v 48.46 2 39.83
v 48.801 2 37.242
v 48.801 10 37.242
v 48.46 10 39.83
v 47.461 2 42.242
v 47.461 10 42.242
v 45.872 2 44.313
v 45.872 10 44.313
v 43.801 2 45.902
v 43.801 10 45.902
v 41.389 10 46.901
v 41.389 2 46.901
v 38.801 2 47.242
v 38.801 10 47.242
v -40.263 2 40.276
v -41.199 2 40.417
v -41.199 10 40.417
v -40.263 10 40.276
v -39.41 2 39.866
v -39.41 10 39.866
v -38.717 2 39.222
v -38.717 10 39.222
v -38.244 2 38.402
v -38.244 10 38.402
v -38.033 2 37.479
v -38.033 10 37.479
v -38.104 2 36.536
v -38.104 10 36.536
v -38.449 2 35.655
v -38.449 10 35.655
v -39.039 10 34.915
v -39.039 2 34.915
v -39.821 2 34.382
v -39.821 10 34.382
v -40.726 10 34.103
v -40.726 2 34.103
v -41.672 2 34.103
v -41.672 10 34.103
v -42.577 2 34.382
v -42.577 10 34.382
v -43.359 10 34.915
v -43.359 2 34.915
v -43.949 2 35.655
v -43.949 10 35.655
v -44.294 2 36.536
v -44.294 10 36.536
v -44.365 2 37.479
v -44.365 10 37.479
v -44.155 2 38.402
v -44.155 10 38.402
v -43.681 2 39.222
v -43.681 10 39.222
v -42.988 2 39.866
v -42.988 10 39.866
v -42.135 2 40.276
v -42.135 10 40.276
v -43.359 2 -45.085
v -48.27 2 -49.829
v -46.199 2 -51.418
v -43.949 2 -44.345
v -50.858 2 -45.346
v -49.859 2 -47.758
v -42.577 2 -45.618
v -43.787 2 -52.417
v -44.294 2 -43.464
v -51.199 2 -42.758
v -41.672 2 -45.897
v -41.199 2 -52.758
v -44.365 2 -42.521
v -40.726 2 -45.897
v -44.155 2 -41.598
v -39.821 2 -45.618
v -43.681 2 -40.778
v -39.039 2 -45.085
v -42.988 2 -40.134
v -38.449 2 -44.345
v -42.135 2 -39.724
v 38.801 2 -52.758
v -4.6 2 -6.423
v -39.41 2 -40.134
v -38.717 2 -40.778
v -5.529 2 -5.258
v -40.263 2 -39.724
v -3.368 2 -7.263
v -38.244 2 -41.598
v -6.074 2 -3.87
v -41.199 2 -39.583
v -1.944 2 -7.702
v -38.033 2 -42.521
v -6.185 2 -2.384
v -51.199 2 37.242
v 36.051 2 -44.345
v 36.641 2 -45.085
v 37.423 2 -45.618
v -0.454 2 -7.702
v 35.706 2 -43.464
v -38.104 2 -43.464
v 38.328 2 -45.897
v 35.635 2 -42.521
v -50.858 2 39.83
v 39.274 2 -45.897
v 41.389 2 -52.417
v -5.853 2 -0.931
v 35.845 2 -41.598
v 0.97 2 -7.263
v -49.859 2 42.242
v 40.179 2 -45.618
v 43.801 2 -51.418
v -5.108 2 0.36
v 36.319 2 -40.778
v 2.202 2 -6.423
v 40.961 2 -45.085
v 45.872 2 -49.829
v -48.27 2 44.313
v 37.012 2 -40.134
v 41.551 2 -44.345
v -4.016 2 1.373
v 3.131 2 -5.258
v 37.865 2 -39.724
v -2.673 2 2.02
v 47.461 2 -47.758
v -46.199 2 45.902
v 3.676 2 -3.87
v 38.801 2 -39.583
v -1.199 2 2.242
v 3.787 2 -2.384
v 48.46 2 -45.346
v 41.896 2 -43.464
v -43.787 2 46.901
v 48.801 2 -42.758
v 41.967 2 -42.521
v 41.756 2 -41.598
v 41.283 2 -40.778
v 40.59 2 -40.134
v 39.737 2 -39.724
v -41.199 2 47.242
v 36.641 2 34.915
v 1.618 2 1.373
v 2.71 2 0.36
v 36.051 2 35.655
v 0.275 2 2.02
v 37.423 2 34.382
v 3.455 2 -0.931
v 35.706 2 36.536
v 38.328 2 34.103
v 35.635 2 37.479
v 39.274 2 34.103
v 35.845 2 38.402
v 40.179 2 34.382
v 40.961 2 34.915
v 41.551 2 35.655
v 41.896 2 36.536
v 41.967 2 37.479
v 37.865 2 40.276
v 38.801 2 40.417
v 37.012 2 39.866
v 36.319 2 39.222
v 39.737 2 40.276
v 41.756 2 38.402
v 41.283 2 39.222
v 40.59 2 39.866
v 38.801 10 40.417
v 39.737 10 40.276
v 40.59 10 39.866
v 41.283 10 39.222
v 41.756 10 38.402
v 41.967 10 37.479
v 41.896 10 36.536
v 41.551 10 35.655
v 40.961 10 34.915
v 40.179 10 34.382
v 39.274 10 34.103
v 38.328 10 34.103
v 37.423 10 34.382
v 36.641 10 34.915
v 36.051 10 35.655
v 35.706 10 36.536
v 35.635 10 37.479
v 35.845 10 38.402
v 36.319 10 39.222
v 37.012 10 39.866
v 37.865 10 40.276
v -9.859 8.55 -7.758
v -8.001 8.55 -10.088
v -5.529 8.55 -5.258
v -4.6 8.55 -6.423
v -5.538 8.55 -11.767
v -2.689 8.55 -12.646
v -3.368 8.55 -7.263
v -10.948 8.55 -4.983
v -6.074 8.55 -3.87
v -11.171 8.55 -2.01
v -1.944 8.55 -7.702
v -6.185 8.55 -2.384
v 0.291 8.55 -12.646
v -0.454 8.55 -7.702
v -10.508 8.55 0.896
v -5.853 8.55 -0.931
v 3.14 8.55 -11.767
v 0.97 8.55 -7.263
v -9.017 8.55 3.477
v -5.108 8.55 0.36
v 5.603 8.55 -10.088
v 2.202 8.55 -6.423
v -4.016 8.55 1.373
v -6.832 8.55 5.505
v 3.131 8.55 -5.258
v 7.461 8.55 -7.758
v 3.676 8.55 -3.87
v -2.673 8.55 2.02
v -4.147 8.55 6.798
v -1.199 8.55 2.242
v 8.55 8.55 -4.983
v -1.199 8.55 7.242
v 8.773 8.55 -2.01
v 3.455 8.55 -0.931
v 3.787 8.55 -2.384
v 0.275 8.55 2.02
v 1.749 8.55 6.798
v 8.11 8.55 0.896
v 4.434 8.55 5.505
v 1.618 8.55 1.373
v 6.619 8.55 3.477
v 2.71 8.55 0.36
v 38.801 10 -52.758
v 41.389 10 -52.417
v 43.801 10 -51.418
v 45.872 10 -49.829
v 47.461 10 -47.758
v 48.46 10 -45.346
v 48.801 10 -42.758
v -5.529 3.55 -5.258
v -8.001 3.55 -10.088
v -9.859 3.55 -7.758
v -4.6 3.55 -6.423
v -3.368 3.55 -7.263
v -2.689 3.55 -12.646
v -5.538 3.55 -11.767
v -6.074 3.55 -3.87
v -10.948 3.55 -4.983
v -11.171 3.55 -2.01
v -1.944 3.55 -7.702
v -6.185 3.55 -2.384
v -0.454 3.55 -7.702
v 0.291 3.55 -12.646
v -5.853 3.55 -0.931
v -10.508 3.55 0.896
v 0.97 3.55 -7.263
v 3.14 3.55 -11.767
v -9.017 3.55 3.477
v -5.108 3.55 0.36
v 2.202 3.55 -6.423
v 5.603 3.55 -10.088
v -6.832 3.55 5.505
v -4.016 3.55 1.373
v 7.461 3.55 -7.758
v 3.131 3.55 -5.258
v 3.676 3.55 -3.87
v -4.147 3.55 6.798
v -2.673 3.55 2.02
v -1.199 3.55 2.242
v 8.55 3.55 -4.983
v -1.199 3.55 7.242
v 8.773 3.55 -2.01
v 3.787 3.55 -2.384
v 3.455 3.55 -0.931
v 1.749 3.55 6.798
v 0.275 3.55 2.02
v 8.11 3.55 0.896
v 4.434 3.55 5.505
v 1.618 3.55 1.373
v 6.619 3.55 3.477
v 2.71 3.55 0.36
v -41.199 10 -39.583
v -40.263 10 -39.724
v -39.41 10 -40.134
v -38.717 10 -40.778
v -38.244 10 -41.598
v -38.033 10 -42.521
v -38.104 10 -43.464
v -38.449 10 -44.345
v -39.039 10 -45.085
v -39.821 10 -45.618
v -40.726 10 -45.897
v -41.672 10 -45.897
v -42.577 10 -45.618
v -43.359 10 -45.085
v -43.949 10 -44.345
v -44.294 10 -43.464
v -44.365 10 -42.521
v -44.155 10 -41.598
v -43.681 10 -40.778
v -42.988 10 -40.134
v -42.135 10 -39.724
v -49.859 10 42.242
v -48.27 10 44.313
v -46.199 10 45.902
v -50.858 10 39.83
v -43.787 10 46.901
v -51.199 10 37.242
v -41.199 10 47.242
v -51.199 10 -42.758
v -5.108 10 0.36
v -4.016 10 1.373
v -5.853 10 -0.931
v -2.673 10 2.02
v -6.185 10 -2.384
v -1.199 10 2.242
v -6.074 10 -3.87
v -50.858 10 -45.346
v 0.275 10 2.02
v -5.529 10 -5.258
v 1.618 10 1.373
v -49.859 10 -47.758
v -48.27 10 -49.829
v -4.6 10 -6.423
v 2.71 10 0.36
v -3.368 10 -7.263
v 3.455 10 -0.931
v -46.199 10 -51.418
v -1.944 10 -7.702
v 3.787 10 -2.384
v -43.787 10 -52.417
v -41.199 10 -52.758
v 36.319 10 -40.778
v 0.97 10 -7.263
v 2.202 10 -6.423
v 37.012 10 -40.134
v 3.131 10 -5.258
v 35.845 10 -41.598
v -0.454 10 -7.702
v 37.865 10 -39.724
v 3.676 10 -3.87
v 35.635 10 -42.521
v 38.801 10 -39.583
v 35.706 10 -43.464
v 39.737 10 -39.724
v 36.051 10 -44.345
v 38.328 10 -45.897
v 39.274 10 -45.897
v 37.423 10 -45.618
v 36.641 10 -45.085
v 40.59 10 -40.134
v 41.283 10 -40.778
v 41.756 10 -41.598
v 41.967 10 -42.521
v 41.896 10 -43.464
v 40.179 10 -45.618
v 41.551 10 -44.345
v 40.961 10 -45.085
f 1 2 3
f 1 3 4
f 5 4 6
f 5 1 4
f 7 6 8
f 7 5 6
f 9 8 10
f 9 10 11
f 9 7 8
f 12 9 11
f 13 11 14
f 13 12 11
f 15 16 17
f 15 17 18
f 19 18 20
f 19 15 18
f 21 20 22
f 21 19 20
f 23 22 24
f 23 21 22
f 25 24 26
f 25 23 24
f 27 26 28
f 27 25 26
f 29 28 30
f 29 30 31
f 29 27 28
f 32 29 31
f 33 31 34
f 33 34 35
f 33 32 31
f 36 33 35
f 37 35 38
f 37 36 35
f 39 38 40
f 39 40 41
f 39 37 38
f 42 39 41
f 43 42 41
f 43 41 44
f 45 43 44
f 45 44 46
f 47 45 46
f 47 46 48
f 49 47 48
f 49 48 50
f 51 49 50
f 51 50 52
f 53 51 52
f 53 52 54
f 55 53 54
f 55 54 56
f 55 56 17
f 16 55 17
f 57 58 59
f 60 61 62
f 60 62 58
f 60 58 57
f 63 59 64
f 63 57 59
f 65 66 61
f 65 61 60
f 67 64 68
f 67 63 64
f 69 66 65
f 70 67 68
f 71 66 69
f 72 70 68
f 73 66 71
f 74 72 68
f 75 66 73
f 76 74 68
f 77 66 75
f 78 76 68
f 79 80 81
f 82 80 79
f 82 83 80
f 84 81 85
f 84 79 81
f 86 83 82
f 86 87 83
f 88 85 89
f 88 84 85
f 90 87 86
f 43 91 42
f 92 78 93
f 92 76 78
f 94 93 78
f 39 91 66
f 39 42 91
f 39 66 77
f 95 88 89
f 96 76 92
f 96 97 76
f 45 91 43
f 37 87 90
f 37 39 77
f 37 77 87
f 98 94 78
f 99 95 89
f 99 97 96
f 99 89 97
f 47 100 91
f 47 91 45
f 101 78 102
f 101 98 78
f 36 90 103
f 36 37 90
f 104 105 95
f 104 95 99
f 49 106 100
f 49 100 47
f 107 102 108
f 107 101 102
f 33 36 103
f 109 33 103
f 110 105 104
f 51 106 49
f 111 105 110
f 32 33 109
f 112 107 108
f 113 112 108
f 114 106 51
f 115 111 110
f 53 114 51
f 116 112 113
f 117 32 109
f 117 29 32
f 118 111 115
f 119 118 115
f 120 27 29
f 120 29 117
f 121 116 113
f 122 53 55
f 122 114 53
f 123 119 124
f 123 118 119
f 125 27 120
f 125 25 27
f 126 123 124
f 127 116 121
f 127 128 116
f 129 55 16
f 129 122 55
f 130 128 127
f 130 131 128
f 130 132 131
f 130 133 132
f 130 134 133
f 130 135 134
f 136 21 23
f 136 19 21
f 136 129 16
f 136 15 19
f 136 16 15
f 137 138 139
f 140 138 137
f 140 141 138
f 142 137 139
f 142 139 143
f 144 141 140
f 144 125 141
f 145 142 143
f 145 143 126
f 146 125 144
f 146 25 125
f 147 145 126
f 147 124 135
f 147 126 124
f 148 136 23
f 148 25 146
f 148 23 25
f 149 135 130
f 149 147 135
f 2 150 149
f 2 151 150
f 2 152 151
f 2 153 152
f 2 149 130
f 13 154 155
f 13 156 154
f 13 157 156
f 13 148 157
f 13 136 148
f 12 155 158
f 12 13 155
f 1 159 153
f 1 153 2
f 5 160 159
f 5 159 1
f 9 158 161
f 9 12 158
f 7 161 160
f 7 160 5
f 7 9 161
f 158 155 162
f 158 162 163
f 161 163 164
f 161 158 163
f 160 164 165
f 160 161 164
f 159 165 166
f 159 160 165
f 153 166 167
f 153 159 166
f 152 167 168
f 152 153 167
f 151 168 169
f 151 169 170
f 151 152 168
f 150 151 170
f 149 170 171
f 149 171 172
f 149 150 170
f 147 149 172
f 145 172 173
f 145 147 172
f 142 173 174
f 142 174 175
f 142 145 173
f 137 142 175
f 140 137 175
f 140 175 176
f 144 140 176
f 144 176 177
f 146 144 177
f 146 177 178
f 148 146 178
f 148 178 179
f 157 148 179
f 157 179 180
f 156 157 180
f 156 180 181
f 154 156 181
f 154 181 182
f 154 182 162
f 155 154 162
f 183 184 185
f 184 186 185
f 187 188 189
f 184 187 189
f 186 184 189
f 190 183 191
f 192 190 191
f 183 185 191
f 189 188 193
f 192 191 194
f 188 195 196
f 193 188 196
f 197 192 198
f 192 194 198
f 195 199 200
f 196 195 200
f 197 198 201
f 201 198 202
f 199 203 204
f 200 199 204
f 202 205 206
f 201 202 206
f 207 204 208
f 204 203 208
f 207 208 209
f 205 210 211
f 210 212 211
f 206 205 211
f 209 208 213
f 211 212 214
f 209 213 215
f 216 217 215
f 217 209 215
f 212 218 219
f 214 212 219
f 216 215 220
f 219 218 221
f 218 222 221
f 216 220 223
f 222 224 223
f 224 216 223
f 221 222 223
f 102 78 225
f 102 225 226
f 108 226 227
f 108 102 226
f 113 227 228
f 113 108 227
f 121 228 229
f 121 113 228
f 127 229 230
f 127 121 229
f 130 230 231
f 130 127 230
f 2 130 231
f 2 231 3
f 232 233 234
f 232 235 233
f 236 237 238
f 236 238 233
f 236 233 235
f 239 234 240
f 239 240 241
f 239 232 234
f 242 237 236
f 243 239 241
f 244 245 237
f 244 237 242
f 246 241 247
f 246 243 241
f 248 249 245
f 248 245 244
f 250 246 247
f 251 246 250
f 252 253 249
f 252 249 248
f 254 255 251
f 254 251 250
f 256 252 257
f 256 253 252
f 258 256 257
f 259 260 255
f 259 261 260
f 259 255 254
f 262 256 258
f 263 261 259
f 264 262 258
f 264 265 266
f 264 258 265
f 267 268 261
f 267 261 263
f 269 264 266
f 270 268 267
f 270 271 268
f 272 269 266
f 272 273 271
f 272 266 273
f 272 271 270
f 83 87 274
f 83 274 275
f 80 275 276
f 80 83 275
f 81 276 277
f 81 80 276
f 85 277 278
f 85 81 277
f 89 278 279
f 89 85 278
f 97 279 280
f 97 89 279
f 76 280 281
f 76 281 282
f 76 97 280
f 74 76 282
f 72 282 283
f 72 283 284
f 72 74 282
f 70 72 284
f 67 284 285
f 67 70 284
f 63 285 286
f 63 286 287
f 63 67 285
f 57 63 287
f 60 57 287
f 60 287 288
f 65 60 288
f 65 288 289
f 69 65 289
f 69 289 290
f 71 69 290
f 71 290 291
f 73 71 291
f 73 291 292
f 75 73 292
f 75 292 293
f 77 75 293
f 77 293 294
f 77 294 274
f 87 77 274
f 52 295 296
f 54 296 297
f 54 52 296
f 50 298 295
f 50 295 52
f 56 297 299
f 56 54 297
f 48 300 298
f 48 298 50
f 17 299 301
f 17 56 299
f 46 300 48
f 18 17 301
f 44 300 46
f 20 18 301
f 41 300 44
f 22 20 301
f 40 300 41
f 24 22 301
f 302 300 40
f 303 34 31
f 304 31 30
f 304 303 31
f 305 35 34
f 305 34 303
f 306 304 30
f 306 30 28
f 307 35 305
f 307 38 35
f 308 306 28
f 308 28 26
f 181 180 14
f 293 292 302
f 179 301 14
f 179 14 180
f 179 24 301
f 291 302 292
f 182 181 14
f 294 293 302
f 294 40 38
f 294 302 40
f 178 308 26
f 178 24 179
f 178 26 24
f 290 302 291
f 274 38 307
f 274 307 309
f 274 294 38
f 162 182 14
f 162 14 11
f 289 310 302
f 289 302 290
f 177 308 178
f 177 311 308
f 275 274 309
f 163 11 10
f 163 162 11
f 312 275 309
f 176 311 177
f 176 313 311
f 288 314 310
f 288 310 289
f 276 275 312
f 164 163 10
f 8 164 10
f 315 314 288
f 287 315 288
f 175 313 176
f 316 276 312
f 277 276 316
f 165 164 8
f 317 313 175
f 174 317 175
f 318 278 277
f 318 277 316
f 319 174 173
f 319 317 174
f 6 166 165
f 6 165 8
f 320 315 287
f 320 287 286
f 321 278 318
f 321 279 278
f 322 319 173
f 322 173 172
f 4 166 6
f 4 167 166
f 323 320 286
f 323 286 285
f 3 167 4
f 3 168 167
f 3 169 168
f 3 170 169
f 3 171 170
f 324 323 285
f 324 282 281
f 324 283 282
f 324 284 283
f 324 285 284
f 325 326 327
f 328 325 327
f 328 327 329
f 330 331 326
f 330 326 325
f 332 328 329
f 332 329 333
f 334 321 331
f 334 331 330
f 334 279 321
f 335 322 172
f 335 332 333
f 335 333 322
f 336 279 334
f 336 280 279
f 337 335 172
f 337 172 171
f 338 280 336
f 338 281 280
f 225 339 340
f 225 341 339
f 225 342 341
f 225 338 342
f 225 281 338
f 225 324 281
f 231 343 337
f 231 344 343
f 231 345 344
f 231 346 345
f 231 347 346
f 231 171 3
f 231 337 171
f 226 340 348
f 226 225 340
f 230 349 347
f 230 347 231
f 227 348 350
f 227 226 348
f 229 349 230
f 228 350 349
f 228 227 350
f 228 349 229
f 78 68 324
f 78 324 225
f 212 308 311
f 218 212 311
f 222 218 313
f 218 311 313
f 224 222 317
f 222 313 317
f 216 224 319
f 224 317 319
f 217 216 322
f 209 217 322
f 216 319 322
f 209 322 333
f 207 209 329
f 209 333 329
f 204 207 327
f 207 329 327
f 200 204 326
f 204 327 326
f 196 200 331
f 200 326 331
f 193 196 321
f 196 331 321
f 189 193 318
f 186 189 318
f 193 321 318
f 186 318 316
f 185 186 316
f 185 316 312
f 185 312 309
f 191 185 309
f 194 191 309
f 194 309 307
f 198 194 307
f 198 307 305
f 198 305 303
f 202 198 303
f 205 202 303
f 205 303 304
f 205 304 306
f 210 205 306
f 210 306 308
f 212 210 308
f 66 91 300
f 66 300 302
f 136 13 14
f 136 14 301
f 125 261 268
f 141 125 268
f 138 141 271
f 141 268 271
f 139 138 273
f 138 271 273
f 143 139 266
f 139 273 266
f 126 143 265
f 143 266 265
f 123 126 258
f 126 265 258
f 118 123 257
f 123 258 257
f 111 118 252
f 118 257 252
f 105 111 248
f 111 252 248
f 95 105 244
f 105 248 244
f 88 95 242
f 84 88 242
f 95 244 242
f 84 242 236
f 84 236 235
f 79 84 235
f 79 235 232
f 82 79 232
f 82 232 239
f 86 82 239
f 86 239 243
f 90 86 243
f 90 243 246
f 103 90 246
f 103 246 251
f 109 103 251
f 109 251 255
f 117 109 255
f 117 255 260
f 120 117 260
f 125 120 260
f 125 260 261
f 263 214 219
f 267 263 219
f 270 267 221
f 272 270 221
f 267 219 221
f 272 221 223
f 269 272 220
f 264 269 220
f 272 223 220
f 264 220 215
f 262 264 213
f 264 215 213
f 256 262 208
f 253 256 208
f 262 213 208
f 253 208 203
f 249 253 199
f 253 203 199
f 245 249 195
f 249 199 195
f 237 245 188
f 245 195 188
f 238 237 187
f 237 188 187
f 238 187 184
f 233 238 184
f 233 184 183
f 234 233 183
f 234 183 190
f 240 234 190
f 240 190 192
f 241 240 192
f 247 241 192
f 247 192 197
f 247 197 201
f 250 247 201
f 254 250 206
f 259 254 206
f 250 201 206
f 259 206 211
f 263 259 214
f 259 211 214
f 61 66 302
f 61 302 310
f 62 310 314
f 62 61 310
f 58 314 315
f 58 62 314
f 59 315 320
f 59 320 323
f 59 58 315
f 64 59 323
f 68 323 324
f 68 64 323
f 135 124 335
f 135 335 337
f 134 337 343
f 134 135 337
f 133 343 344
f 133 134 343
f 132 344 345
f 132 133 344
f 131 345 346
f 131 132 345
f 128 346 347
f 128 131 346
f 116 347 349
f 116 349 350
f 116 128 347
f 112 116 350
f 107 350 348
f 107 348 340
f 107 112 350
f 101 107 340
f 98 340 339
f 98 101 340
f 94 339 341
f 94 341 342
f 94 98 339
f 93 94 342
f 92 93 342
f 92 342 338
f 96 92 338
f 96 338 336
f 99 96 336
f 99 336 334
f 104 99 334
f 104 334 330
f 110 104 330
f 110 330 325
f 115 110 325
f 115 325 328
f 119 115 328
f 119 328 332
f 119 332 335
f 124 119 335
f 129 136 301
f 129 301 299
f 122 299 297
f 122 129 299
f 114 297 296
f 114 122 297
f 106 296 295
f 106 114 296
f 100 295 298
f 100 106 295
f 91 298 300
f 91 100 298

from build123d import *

# Parameters (mm, degrees)
SKETCH1_R           = 12.7
SKETCH1_R_2         = 3.175
BOSS_EXTRUDE1_DEPTH = 10
SKETCH1_3_R         = 12.7
SKETCH1_3_R_2       = 6.35
BOSS_EXTRUDE2_DEPTH = 2.5
SKETCH2_R           = 12.7
BOSS_EXTRUDE3_DEPTH = 10
SKETCH3_R           = 5
CUT_EXTRUDE3_DEPTH  = 10
CUT_EXTRUDE4_START  = -1.45
SKETCH4_R           = 10
CUT_EXTRUDE4_DEPTH  = 5
CUT_EXTRUDE5_DEPTH  = 2


with BuildPart() as part:
    # Sketch1 → Boss-Extrude1 (new body)
    with BuildSketch(Plane(origin=(0, 0, 0), x_dir=(1, 0, 0), z_dir=(0, 1, 0))):
        with BuildLine():
            Line((-41.199040767, 52.757793765), (38.800959233, 52.757793765))
            ThreePointArc((38.800959233, 52.757793765), (45.872027044, 49.828861577), (48.800959233, 42.757793765))
            Line((48.800959233, 42.757793765), (48.800959233, -37.242206235))
            ThreePointArc((48.800959233, -37.242206235), (45.872027044, -44.313274047), (38.800959233, -47.242206235))
            Line((38.800959233, -47.242206235), (-41.199040767, -47.242206235))
            ThreePointArc((-41.199040767, -47.242206235), (-48.270108579, -44.313274047), (-51.199040767, -37.242206235))
            Line((-51.199040767, -37.242206235), (-51.199040767, 42.757793765))
            ThreePointArc((-51.199040767, 42.757793765), (-48.270108579, 49.828861577), (-41.199040767, 52.757793765))
        make_face()
        with Locations(Location((0, 0, 0), (0, 0, 270))):
            Circle(SKETCH1_R, mode=Mode.SUBTRACT)
        with Locations(Location((-41.199040767, 42.757793765, 0), (0, 0, 270))):
            Circle(SKETCH1_R_2, mode=Mode.SUBTRACT)
        with Locations(Location((38.800959233, 42.757793765, 0), (0, 0, 270))):
            Circle(SKETCH1_R_2, mode=Mode.SUBTRACT)
        with Locations(Location((38.800959233, -37.242206235, 0), (0, 0, 270))):
            Circle(SKETCH1_R_2, mode=Mode.SUBTRACT)
        with Locations(Location((-41.199040767, -37.242206235, 0), (0, 0, 270))):
            Circle(SKETCH1_R_2, mode=Mode.SUBTRACT)
    extrude(amount=BOSS_EXTRUDE1_DEPTH)

    # Sketch1<3> → Boss-Extrude2 (add)
    with BuildSketch(Plane(origin=(0, 0, 0), x_dir=(1, 0, 0), z_dir=(0, 1, 0))):
        with Locations(Location((0, 0, 0), (0, 0, 270))):
            Circle(SKETCH1_3_R)
        with Locations(Location((0, 0, 0), (0, 0, 270))):
            Circle(SKETCH1_3_R_2, mode=Mode.SUBTRACT)
    extrude(amount=BOSS_EXTRUDE2_DEPTH)

    # Sketch2 → Boss-Extrude3 (add, through all)
    with BuildSketch(Plane(origin=(0, 10, 0), x_dir=(1, 0, 0), z_dir=(0, 1, 0))):
        Circle(SKETCH2_R)
    extrude(amount=-BOSS_EXTRUDE3_DEPTH)

    # Sketch3 → Cut-Extrude3 (cut)
    with BuildSketch(Plane(origin=(0, 10, 0), x_dir=(1, 0, 0), z_dir=(0, 1, 0))):
        with Locations(Location((-1.199040767, 2.757793765, 0), (0, 0, 270))):
            Circle(SKETCH3_R)
    extrude(amount=-CUT_EXTRUDE3_DEPTH, mode=Mode.SUBTRACT)

    # Sketch4 → Cut-Extrude4 (cut)
    with BuildSketch(Plane(origin=(0, 10, 0), x_dir=(1, 0, 0), z_dir=(0, 1, 0)).offset(CUT_EXTRUDE4_START)):
        with Locations(Location((-1.199040767, 2.757793765, 0), (0, 0, 270))):
            Circle(SKETCH4_R)
    extrude(amount=-CUT_EXTRUDE4_DEPTH, mode=Mode.SUBTRACT)

    # Sketch6 → Cut-Extrude5 (cut)
    with BuildSketch(Plane.XZ):
        with BuildLine():
            Line((48.800959233, -42.757793765), (48.800959233, 37.242206235))
            ThreePointArc((48.800959233, 37.242206235), (45.872027044, 44.313274047), (38.800959233, 47.242206235))
            Line((38.800959233, 47.242206235), (-41.199040767, 47.242206235))
            ThreePointArc((-41.199040767, 47.242206235), (-48.270108579, 44.313274047), (-51.199040767, 37.242206235))
            Line((-51.199040767, 37.242206235), (-51.199040767, -42.757793765))
            ThreePointArc((-51.199040767, -42.757793765), (-48.270108579, -49.828861577), (-41.199040767, -52.757793765))
            Line((-41.199040767, -52.757793765), (38.800959233, -52.757793765))
            ThreePointArc((38.800959233, -52.757793765), (45.872027044, -49.828861577), (48.800959233, -42.757793765))
        make_face()
    extrude(amount=-CUT_EXTRUDE5_DEPTH, mode=Mode.SUBTRACT)


solid = part.part
